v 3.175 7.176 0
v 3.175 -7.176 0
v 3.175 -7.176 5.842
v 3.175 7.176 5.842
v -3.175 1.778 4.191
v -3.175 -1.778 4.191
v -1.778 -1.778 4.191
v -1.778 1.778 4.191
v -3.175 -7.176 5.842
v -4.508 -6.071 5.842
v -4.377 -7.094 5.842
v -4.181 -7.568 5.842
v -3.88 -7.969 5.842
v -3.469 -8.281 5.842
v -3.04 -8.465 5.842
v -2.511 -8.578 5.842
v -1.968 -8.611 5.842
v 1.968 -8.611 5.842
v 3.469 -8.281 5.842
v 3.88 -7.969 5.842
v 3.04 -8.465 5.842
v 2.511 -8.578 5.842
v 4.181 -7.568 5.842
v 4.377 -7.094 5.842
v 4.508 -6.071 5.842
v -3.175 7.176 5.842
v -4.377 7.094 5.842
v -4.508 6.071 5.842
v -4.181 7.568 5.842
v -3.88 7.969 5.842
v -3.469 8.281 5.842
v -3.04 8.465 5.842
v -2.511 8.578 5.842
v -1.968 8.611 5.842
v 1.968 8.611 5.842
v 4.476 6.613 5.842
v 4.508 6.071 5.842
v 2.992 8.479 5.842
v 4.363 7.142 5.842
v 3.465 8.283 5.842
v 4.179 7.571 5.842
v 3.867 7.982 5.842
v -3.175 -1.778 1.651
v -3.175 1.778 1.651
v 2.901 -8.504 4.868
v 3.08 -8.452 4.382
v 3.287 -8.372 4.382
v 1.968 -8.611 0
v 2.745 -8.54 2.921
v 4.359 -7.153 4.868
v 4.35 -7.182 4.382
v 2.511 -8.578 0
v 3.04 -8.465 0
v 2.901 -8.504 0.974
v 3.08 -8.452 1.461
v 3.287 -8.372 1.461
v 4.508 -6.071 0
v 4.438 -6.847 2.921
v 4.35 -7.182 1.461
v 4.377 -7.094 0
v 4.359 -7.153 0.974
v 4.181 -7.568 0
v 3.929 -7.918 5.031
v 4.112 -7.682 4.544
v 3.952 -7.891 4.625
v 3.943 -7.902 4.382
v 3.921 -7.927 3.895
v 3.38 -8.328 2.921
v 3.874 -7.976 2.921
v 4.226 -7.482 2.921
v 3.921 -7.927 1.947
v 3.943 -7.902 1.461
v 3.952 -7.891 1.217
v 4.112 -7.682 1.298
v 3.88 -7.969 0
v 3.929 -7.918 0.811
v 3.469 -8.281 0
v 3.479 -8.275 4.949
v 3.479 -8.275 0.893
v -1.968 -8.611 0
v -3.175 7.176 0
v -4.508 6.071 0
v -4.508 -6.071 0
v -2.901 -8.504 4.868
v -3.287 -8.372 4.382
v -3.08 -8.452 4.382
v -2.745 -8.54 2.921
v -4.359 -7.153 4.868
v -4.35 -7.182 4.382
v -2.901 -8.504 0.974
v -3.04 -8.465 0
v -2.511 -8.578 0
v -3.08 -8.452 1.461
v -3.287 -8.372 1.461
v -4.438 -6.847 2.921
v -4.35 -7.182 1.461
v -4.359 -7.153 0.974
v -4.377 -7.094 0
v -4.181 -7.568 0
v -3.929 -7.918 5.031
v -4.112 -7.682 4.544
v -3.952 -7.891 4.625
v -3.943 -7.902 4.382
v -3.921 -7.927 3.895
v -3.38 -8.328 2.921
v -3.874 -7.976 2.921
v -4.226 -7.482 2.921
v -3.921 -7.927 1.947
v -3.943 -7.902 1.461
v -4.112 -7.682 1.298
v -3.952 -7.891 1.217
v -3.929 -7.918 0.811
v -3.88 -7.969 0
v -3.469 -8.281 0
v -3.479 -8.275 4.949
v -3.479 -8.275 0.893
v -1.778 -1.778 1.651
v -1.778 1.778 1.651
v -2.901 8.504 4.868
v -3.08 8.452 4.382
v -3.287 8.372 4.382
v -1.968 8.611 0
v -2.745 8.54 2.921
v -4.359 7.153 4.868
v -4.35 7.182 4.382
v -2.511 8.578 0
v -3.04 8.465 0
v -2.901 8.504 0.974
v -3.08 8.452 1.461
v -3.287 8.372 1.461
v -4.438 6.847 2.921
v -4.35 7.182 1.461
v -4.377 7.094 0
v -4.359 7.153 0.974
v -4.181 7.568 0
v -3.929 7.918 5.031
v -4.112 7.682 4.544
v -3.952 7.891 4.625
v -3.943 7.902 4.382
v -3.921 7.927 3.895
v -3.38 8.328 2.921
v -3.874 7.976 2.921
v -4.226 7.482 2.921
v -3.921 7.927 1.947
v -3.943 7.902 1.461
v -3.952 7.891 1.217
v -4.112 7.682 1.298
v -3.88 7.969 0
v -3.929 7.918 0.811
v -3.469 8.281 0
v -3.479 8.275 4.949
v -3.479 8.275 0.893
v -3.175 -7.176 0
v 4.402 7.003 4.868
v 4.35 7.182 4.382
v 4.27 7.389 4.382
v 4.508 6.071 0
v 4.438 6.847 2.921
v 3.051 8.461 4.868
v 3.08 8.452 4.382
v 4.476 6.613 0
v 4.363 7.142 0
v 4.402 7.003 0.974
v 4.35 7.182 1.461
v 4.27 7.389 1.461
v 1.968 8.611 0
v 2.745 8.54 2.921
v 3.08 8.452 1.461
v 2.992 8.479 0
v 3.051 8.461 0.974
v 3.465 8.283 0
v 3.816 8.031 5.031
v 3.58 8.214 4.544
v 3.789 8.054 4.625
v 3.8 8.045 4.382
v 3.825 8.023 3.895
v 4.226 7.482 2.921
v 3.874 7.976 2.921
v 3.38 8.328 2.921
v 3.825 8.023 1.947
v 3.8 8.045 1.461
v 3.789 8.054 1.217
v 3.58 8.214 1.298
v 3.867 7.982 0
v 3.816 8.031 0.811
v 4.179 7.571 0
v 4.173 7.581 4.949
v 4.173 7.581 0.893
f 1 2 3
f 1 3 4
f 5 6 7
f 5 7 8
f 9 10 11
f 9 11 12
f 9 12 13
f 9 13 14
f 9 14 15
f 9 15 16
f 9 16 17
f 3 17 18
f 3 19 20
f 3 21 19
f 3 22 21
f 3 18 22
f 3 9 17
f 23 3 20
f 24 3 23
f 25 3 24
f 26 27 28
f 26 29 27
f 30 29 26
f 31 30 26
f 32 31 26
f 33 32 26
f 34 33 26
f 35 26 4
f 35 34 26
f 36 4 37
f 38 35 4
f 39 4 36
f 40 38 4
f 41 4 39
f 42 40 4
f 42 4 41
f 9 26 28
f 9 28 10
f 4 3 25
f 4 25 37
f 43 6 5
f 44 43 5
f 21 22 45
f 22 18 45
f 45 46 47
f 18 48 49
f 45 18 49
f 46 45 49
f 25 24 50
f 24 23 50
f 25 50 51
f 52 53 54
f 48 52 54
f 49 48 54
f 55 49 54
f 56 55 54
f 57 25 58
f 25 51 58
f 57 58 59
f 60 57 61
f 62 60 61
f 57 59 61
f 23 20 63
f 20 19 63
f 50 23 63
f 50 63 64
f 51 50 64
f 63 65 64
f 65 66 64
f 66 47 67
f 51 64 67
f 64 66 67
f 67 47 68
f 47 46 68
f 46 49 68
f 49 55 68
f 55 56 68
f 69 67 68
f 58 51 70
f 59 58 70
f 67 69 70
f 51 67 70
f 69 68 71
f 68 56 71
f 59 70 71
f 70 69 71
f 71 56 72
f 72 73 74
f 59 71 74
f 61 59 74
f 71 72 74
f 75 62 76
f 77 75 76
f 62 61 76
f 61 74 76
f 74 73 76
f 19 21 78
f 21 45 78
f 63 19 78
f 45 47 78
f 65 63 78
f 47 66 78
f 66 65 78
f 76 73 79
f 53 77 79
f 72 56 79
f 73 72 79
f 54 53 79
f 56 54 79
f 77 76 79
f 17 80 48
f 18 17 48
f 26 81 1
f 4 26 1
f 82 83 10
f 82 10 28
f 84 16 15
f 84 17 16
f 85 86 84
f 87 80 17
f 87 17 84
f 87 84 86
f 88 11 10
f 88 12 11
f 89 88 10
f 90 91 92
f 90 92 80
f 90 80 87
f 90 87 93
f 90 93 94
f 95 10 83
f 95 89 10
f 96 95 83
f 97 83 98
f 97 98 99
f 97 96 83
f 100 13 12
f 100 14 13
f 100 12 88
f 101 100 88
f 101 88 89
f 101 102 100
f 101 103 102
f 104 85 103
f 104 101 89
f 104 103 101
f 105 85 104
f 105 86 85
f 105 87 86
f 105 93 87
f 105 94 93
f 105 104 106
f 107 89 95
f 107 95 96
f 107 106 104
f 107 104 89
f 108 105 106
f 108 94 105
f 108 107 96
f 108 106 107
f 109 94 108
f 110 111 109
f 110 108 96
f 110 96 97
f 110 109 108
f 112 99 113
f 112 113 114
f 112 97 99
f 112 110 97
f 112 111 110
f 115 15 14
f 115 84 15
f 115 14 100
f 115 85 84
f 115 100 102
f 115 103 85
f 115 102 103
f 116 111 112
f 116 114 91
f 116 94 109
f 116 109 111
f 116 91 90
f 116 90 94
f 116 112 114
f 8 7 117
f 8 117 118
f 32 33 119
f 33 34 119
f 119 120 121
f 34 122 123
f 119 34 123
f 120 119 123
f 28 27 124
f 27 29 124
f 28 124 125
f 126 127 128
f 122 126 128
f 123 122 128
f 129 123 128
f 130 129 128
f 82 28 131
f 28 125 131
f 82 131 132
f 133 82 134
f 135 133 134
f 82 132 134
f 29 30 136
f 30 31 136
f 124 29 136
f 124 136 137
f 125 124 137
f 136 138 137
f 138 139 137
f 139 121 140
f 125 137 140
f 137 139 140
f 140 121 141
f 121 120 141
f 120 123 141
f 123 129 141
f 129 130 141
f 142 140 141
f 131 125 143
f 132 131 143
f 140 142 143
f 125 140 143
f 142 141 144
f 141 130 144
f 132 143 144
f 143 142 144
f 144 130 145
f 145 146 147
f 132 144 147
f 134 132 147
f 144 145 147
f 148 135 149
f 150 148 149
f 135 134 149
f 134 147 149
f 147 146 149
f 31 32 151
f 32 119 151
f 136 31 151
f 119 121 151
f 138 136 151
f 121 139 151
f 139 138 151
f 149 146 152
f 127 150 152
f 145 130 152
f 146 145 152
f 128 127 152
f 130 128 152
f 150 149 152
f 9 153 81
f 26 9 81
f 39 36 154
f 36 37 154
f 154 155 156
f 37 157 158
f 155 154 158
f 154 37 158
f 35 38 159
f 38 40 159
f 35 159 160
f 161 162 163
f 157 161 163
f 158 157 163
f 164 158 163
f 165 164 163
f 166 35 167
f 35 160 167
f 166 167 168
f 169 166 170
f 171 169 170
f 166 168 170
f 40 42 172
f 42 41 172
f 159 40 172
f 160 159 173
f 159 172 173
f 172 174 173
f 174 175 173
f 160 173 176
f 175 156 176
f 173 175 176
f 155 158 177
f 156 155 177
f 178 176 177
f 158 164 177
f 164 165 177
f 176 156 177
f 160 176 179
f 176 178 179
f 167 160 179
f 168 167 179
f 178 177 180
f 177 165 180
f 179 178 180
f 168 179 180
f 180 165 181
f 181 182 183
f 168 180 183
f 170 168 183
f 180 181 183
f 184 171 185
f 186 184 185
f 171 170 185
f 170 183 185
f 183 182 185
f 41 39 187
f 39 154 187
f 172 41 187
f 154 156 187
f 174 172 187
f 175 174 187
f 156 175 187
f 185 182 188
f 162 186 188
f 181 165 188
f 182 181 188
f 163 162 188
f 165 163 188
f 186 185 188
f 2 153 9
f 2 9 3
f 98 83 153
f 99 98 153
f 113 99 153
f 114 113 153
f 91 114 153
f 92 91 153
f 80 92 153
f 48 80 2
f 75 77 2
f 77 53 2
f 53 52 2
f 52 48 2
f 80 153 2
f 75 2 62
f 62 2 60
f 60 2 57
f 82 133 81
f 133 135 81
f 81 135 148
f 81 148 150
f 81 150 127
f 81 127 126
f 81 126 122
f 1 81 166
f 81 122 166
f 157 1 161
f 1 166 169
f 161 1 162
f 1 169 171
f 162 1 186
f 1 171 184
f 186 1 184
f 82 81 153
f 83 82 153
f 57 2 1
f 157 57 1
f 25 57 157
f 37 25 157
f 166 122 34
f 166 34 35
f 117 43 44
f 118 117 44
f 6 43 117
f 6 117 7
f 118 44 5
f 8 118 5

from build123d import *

# Parameters (mm, degrees)
F0_W        = 9.017
F0_H        = 17.2212
F0_W_2      = 6.35
F0_H_2      = 14.351
F1_DEPTH    = 5.842
F2_T1_DEPTH = 18.542
F3_W        = 3.556
F3_H        = 2.54
F4_DEPTH    = 1.397


# Not quite as in the source:
# - a fillet or chamfer that OpenCascade refuses, or shapes differently, is made with other operations: its cross-section is extruded or revolved along the edge and cut away or added


with BuildPart() as f1:
    # F0 (on Top) → F1 (new body)
    with BuildSketch(Plane.XY):
        Rectangle(F0_W, F0_H)
        Rectangle(F0_W_2, F0_H_2, mode=Mode.SUBTRACT)
    extrude(amount=F1_DEPTH)

    # F2: fillet of radius 2.54 on 4 edges, made by hand

    # F2_s2 → F2_t1 (cut)
    with BuildSketch(Plane.XY.offset(-6.35)):
        with BuildLine():
            add(Edge.make_bspline(
                [(-1.9685, 8.6106), (-4.5085, 8.6106), (-4.5085, 6.0706)],
                knots=[0, 0, 0, 1, 1, 1], degree=2, weights=[1, 1, 1]))
            Line((-4.5085, 6.0706), (-4.5085, 8.6106))
            Line((-4.5085, 8.6106), (-1.9685, 8.6106))
        make_face()
        with BuildLine():
            add(Edge.make_bspline(
                [(-1.9685, -8.6106), (-4.5085, -8.6106), (-4.5085, -6.0706)],
                knots=[0, 0, 0, 1, 1, 1], degree=2, weights=[1, 1, 1]))
            Line((-4.5085, -6.0706), (-4.5085, -8.6106))
            Line((-4.5085, -8.6106), (-1.9685, -8.6106))
        make_face()
        with BuildLine():
            add(Edge.make_bspline(
                [(1.9685, -8.6106), (4.5085, -8.6106), (4.5085, -6.0706)],
                knots=[0, 0, 0, 1, 1, 1], degree=2, weights=[1, 1, 1]))
            Line((4.5085, -6.0706), (4.5085, -8.6106))
            Line((4.5085, -8.6106), (1.9685, -8.6106))
        make_face()
        with BuildLine():
            add(Edge.make_bspline(
                [(4.5085, 6.0706), (4.5085, 8.6106), (1.9685, 8.6106)],
                knots=[0, 0, 0, 1, 1, 1], degree=2, weights=[1, 1, 1]))
            Line((1.9685, 8.6106), (4.5085, 8.6106))
            Line((4.5085, 8.6106), (4.5085, 6.0706))
        make_face()
    extrude(amount=F2_T1_DEPTH, mode=Mode.SUBTRACT)


with BuildPart() as f4:
    # F3 (on face) → F4 (new body)
    with BuildSketch(Plane.YZ.offset(-3.175)):
        with Locations((0, 2.921)):
            Rectangle(F3_W, F3_H)
    extrude(amount=F4_DEPTH)


solid = Compound([f1.part, f4.part])
